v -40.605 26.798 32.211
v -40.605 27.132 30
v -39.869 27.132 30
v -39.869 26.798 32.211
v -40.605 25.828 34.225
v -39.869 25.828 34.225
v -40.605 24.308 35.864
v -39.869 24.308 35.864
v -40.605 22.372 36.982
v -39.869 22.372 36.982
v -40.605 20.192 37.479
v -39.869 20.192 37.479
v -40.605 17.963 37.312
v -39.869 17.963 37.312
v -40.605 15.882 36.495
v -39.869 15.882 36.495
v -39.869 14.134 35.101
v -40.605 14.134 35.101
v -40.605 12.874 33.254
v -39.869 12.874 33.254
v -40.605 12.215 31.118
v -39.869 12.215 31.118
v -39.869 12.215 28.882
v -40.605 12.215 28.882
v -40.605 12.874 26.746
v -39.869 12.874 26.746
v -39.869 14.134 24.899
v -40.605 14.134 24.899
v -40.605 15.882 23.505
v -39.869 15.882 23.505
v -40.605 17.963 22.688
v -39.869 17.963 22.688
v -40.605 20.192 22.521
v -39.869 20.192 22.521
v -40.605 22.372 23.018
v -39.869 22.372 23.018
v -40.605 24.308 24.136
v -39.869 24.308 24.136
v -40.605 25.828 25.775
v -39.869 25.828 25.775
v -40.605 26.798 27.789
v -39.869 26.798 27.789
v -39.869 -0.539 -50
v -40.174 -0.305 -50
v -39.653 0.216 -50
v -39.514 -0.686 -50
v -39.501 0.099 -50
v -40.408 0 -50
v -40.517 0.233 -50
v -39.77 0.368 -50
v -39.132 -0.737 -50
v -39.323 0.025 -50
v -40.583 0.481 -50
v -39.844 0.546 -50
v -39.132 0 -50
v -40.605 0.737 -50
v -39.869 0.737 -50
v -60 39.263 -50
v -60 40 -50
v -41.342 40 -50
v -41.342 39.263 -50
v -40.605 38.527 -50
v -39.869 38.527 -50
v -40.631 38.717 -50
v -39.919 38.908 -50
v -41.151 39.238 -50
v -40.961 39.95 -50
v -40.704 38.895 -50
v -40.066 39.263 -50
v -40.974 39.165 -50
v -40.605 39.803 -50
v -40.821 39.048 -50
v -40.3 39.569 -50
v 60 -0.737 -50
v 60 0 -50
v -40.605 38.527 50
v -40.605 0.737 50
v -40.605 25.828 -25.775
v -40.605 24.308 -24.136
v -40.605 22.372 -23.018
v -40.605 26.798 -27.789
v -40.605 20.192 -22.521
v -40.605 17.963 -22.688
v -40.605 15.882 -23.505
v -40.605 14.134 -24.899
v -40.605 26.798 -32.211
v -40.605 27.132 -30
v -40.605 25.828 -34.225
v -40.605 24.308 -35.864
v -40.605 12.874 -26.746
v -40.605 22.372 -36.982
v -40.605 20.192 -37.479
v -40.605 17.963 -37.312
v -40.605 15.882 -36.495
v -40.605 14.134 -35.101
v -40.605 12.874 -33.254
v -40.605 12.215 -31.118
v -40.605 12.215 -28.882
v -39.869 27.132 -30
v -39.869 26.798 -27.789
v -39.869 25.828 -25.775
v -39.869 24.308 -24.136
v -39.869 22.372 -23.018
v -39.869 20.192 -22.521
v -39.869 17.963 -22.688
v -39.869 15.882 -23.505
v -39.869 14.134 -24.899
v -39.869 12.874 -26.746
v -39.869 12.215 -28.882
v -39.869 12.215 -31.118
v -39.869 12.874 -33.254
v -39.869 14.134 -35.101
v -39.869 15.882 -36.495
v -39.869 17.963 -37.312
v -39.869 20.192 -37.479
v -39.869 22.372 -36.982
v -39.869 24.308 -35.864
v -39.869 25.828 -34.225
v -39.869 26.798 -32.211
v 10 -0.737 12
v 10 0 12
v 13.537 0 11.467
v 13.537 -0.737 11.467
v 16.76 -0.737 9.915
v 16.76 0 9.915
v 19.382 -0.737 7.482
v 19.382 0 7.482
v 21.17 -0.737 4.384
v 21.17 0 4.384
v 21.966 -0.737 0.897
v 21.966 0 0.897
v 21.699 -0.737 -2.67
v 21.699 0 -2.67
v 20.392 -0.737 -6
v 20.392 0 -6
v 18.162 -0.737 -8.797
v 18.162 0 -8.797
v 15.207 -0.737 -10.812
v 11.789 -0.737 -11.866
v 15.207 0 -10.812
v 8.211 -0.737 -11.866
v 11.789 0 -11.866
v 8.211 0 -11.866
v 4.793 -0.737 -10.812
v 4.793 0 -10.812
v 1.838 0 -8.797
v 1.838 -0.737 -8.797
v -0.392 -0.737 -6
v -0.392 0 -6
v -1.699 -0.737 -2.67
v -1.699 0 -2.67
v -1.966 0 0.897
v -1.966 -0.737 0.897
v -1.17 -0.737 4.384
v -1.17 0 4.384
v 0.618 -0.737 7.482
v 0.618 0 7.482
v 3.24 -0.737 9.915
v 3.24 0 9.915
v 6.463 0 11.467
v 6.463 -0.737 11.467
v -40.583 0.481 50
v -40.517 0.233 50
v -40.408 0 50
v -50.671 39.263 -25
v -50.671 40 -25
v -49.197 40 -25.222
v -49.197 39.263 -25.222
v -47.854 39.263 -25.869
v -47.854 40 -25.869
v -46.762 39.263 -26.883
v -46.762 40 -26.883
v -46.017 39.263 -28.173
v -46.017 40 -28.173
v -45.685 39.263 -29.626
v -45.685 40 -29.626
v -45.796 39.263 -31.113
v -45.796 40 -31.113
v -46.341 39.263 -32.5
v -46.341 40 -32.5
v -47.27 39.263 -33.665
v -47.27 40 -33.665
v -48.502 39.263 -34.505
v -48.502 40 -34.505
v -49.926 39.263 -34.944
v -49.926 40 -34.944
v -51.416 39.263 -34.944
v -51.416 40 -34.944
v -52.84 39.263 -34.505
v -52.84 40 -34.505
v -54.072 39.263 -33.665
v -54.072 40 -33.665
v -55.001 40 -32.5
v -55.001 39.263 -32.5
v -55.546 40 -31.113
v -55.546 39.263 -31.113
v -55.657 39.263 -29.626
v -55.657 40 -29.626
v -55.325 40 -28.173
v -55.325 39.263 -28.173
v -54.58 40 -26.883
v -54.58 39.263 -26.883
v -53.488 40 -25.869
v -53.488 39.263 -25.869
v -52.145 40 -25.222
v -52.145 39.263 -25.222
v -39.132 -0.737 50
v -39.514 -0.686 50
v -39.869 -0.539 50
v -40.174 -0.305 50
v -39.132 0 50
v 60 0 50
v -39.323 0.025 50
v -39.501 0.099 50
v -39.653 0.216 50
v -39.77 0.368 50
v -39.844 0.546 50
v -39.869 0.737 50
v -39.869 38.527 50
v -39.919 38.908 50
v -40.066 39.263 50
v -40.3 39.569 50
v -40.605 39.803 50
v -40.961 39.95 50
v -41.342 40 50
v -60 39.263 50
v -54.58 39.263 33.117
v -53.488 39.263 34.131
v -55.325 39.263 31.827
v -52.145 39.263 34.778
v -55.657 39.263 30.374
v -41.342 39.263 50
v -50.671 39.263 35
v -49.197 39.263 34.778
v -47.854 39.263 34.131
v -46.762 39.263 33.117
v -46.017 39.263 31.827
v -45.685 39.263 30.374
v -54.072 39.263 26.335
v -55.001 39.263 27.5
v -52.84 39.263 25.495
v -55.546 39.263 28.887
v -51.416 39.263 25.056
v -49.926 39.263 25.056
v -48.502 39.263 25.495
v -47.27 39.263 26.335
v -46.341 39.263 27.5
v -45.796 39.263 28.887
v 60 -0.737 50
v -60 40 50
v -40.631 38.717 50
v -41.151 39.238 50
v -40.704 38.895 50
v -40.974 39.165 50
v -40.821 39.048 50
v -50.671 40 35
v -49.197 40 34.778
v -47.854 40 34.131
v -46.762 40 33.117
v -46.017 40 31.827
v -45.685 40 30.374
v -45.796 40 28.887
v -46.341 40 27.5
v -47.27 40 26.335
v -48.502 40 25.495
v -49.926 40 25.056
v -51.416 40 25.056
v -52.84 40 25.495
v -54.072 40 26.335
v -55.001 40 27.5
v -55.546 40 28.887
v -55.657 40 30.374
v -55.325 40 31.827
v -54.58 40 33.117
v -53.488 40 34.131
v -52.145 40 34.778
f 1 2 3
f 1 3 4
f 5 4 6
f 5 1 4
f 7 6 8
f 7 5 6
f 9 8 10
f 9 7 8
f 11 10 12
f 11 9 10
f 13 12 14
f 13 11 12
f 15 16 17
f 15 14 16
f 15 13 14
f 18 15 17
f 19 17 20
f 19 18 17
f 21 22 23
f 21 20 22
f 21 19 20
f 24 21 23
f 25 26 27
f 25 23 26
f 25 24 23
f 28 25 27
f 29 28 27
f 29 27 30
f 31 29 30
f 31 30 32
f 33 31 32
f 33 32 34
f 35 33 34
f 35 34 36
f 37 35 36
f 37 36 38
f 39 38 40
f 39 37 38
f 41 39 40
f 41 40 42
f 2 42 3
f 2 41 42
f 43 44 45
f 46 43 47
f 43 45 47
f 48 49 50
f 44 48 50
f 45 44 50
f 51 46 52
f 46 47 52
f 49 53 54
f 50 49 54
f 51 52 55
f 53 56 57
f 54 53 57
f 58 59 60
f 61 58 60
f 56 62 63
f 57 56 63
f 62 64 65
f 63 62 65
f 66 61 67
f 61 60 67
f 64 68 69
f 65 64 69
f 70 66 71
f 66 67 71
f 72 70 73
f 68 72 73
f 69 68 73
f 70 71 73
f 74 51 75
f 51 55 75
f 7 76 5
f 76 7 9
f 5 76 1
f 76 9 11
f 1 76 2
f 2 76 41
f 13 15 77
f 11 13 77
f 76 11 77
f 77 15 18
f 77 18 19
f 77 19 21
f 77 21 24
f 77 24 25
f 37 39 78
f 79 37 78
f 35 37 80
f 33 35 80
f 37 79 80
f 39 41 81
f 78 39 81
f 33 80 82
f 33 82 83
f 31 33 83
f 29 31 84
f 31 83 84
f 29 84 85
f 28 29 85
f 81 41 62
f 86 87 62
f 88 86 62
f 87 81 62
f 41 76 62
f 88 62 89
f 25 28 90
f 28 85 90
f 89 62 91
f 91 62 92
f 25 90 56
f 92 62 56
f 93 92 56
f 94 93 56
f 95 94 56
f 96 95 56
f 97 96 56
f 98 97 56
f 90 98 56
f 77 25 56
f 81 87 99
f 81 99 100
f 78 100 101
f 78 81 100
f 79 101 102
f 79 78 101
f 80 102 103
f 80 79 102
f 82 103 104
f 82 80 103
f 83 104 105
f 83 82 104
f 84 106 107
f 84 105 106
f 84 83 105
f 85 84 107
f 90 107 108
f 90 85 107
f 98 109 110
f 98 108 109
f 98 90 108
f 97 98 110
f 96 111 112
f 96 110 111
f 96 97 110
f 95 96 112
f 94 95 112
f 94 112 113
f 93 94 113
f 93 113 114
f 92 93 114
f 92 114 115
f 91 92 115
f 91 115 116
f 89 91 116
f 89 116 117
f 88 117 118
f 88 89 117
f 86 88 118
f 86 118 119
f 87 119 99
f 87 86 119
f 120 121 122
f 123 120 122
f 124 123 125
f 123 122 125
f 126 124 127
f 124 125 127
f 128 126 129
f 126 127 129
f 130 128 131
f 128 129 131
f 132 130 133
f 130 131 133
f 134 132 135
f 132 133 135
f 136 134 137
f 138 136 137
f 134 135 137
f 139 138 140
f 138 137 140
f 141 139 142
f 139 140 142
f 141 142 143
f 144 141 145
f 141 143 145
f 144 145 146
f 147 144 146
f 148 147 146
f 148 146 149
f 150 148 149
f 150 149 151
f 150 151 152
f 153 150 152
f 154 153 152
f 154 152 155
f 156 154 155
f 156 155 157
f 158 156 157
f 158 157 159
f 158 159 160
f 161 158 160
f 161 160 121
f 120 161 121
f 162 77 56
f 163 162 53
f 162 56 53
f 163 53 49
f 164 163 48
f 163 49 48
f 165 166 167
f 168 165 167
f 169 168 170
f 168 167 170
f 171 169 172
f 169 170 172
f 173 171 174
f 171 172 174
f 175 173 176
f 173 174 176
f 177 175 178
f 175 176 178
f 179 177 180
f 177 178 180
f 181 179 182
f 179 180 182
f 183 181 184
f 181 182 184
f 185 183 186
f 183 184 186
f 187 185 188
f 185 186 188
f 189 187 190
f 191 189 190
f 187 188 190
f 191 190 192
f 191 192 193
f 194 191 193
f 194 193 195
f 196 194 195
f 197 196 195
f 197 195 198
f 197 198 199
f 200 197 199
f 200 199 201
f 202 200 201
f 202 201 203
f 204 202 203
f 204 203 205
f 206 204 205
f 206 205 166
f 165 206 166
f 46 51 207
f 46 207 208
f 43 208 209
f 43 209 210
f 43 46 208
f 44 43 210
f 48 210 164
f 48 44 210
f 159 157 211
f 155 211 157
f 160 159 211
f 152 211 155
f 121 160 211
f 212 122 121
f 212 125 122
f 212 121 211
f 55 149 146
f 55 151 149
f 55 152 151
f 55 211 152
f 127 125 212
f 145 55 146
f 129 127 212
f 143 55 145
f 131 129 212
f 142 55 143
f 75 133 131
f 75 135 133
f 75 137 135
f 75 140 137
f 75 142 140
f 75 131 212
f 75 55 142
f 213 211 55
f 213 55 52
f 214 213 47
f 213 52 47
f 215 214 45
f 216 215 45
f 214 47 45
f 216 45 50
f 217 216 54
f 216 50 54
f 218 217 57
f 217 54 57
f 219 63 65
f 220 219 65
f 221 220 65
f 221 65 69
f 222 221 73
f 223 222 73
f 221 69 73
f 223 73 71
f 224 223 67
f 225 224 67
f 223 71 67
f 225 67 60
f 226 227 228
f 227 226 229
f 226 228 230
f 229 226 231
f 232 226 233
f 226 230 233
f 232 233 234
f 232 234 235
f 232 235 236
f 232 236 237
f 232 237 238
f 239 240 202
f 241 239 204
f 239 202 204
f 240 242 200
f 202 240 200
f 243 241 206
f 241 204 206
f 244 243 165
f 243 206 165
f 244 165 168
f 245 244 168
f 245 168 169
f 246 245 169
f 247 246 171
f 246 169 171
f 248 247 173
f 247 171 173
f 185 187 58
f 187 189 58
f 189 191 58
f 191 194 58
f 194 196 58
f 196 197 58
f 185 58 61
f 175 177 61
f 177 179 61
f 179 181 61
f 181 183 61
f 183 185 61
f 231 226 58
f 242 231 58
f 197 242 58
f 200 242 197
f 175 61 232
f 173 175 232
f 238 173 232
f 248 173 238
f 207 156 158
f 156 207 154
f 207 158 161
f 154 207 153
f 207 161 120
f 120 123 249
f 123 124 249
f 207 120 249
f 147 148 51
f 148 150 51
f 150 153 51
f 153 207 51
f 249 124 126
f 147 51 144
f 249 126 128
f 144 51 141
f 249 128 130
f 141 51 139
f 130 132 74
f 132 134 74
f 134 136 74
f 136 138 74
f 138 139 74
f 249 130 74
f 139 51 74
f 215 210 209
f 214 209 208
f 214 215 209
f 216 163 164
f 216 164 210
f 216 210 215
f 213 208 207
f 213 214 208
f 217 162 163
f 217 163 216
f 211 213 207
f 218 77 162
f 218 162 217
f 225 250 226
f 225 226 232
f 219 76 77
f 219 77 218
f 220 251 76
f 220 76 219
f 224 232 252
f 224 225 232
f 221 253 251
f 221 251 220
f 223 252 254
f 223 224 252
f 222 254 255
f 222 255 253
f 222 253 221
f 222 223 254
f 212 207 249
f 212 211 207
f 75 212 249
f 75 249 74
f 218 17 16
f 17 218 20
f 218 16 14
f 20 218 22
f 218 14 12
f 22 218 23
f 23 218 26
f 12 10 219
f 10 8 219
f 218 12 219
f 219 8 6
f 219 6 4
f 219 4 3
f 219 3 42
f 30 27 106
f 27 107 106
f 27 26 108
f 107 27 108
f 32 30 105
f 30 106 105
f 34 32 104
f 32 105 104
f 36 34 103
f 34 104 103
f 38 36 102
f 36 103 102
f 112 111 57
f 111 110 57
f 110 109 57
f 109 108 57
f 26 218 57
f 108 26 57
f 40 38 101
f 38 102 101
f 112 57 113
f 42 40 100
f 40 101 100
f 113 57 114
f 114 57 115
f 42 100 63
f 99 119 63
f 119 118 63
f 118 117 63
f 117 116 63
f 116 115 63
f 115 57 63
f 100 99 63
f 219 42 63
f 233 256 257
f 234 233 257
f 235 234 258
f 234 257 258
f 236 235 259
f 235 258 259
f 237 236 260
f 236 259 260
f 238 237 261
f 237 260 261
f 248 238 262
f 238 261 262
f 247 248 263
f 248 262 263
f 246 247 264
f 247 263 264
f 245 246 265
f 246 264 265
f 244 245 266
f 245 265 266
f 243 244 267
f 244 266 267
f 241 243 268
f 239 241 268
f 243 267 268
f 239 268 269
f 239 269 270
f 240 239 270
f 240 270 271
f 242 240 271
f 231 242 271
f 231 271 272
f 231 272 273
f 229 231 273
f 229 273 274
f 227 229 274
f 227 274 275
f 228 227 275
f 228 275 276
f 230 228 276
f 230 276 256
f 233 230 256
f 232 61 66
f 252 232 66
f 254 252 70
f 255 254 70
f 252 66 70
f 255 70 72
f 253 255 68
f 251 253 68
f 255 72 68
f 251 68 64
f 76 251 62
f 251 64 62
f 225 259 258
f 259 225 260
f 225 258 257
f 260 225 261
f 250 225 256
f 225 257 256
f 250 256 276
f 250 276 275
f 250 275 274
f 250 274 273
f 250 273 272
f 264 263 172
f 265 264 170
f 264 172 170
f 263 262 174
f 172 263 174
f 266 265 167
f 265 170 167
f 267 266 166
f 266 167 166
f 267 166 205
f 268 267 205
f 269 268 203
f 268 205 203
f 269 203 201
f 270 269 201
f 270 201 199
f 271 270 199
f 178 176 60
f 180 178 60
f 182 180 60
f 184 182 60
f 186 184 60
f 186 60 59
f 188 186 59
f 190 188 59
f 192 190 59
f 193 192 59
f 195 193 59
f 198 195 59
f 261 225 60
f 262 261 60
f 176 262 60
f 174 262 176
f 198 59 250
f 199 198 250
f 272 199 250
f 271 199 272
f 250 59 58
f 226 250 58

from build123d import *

# Parameters (mm, degrees)
SKETCH5_W               = 120
SKETCH5_H               = 100
BASE_FLANGE1_DEPTH      = 0.7366
JOG1_START              = -50
JOG1_DEPTH              = 100
JOG1_2_DEPTH            = 100
SKETCH15_R              = 12
CUT_EXTRUDE1_DEPTH      = 2
SKETCH21_R              = 5
CUT_EXTRUDE3_DEPTH      = 1.8
CUT_EXTRUDE4_DEPTH      = 2
CUT_EXTRUDE4_DEPTH_BACK = 1.8
SKETCH22_R              = 7.5


# Read off the part's stored shape, not the designer's step: Jog1
# Sheet-metal steps are written as plain solids
with BuildPart() as part:
    # Sketch5 → Base-Flange1 (new body)
    with BuildSketch(Plane(origin=(0, 0, 0), x_dir=(1, 0, 0), z_dir=(0, 1, 0))):
        Rectangle(SKETCH5_W, SKETCH5_H)
    extrude(amount=-BASE_FLANGE1_DEPTH)

    # Jog1 outline → Jog1 (cut)
    with BuildSketch(Plane.XY.offset(JOG1_START)):
        with BuildLine():
            ThreePointArc((-39.132213569, -0.7366), (-39.868813569, -0.539228625), (-40.408042194, 0))
            Line((-40.408042194, 0), (-60, 0))
            Line((-60, 0), (-60, -0.7366))
            Line((-60, -0.7366), (-39.132213569, -0.7366))
        make_face()
    extrude(amount=JOG1_DEPTH, mode=Mode.SUBTRACT)

    # Jog1 2 outline → Jog1 2 (add)
    with BuildSketch(Plane.XY.offset(JOG1_START)):
        with BuildLine():
            Line((-40.605413569, 38.5268), (-40.605413569, 0.7366))
            ThreePointArc((-40.605413569, 0.7366), (-40.555215496, 0.355307783), (-40.408042194, 0))
            Line((-40.408042194, 0), (-39.132213569, 0))
            ThreePointArc((-39.132213569, 0), (-39.653068424, 0.215745145), (-39.868813569, 0.7366))
            Line((-39.868813569, 0.7366), (-39.868813569, 38.5268))
            ThreePointArc((-39.868813569, 38.5268), (-40.300303859, 39.56850971), (-41.342013569, 40))
            Line((-41.342013569, 40), (-60, 40))
            Line((-60, 40), (-60, 39.2634))
            Line((-60, 39.2634), (-41.342013569, 39.2634))
            ThreePointArc((-41.342013569, 39.2634), (-40.821158714, 39.047654855), (-40.605413569, 38.5268))
        make_face()
    extrude(amount=JOG1_2_DEPTH)

    # Sketch15 → Cut-Extrude1 (cut)
    with BuildSketch(Plane(origin=(0, 0, 0), x_dir=(1, 0, 0), z_dir=(0, 1, 0))):
        with Locations(Location((10, 0, 0), (0, 0, 270))):
            Circle(SKETCH15_R)
    extrude(amount=-CUT_EXTRUDE1_DEPTH, mode=Mode.SUBTRACT)

    # Sketch21 → Cut-Extrude3 (cut)
    with BuildSketch(Plane(origin=(0, 40, 0), x_dir=(1, 0, 0), z_dir=(0, 1, 0))):
        with Locations(Location((-50.671006785, 30, 0), (0, 0, 270))):
            Circle(SKETCH21_R)
        with Locations(Location((-50.671006785, -30, 0), (0, 0, 270))):
            Circle(SKETCH21_R)
    extrude(amount=-CUT_EXTRUDE3_DEPTH, mode=Mode.SUBTRACT)

    # Sketch22 → Cut-Extrude4 (cut, two sides: drawn at the far end of the back side and taken through both)
    with BuildSketch(Plane(origin=(-40, 0, 0), x_dir=(0, 0, -1), z_dir=(1, 0, 0)).offset(-CUT_EXTRUDE4_DEPTH_BACK)):
        with Locations(Location((30, 19.6317, 0), (0, 0, 90))):
            Circle(SKETCH22_R)
        with Locations(Location((-30, 19.6317, 0), (0, 0, 90))):
            Circle(SKETCH22_R)
    extrude(amount=CUT_EXTRUDE4_DEPTH + CUT_EXTRUDE4_DEPTH_BACK, mode=Mode.SUBTRACT)


solid = part.part
